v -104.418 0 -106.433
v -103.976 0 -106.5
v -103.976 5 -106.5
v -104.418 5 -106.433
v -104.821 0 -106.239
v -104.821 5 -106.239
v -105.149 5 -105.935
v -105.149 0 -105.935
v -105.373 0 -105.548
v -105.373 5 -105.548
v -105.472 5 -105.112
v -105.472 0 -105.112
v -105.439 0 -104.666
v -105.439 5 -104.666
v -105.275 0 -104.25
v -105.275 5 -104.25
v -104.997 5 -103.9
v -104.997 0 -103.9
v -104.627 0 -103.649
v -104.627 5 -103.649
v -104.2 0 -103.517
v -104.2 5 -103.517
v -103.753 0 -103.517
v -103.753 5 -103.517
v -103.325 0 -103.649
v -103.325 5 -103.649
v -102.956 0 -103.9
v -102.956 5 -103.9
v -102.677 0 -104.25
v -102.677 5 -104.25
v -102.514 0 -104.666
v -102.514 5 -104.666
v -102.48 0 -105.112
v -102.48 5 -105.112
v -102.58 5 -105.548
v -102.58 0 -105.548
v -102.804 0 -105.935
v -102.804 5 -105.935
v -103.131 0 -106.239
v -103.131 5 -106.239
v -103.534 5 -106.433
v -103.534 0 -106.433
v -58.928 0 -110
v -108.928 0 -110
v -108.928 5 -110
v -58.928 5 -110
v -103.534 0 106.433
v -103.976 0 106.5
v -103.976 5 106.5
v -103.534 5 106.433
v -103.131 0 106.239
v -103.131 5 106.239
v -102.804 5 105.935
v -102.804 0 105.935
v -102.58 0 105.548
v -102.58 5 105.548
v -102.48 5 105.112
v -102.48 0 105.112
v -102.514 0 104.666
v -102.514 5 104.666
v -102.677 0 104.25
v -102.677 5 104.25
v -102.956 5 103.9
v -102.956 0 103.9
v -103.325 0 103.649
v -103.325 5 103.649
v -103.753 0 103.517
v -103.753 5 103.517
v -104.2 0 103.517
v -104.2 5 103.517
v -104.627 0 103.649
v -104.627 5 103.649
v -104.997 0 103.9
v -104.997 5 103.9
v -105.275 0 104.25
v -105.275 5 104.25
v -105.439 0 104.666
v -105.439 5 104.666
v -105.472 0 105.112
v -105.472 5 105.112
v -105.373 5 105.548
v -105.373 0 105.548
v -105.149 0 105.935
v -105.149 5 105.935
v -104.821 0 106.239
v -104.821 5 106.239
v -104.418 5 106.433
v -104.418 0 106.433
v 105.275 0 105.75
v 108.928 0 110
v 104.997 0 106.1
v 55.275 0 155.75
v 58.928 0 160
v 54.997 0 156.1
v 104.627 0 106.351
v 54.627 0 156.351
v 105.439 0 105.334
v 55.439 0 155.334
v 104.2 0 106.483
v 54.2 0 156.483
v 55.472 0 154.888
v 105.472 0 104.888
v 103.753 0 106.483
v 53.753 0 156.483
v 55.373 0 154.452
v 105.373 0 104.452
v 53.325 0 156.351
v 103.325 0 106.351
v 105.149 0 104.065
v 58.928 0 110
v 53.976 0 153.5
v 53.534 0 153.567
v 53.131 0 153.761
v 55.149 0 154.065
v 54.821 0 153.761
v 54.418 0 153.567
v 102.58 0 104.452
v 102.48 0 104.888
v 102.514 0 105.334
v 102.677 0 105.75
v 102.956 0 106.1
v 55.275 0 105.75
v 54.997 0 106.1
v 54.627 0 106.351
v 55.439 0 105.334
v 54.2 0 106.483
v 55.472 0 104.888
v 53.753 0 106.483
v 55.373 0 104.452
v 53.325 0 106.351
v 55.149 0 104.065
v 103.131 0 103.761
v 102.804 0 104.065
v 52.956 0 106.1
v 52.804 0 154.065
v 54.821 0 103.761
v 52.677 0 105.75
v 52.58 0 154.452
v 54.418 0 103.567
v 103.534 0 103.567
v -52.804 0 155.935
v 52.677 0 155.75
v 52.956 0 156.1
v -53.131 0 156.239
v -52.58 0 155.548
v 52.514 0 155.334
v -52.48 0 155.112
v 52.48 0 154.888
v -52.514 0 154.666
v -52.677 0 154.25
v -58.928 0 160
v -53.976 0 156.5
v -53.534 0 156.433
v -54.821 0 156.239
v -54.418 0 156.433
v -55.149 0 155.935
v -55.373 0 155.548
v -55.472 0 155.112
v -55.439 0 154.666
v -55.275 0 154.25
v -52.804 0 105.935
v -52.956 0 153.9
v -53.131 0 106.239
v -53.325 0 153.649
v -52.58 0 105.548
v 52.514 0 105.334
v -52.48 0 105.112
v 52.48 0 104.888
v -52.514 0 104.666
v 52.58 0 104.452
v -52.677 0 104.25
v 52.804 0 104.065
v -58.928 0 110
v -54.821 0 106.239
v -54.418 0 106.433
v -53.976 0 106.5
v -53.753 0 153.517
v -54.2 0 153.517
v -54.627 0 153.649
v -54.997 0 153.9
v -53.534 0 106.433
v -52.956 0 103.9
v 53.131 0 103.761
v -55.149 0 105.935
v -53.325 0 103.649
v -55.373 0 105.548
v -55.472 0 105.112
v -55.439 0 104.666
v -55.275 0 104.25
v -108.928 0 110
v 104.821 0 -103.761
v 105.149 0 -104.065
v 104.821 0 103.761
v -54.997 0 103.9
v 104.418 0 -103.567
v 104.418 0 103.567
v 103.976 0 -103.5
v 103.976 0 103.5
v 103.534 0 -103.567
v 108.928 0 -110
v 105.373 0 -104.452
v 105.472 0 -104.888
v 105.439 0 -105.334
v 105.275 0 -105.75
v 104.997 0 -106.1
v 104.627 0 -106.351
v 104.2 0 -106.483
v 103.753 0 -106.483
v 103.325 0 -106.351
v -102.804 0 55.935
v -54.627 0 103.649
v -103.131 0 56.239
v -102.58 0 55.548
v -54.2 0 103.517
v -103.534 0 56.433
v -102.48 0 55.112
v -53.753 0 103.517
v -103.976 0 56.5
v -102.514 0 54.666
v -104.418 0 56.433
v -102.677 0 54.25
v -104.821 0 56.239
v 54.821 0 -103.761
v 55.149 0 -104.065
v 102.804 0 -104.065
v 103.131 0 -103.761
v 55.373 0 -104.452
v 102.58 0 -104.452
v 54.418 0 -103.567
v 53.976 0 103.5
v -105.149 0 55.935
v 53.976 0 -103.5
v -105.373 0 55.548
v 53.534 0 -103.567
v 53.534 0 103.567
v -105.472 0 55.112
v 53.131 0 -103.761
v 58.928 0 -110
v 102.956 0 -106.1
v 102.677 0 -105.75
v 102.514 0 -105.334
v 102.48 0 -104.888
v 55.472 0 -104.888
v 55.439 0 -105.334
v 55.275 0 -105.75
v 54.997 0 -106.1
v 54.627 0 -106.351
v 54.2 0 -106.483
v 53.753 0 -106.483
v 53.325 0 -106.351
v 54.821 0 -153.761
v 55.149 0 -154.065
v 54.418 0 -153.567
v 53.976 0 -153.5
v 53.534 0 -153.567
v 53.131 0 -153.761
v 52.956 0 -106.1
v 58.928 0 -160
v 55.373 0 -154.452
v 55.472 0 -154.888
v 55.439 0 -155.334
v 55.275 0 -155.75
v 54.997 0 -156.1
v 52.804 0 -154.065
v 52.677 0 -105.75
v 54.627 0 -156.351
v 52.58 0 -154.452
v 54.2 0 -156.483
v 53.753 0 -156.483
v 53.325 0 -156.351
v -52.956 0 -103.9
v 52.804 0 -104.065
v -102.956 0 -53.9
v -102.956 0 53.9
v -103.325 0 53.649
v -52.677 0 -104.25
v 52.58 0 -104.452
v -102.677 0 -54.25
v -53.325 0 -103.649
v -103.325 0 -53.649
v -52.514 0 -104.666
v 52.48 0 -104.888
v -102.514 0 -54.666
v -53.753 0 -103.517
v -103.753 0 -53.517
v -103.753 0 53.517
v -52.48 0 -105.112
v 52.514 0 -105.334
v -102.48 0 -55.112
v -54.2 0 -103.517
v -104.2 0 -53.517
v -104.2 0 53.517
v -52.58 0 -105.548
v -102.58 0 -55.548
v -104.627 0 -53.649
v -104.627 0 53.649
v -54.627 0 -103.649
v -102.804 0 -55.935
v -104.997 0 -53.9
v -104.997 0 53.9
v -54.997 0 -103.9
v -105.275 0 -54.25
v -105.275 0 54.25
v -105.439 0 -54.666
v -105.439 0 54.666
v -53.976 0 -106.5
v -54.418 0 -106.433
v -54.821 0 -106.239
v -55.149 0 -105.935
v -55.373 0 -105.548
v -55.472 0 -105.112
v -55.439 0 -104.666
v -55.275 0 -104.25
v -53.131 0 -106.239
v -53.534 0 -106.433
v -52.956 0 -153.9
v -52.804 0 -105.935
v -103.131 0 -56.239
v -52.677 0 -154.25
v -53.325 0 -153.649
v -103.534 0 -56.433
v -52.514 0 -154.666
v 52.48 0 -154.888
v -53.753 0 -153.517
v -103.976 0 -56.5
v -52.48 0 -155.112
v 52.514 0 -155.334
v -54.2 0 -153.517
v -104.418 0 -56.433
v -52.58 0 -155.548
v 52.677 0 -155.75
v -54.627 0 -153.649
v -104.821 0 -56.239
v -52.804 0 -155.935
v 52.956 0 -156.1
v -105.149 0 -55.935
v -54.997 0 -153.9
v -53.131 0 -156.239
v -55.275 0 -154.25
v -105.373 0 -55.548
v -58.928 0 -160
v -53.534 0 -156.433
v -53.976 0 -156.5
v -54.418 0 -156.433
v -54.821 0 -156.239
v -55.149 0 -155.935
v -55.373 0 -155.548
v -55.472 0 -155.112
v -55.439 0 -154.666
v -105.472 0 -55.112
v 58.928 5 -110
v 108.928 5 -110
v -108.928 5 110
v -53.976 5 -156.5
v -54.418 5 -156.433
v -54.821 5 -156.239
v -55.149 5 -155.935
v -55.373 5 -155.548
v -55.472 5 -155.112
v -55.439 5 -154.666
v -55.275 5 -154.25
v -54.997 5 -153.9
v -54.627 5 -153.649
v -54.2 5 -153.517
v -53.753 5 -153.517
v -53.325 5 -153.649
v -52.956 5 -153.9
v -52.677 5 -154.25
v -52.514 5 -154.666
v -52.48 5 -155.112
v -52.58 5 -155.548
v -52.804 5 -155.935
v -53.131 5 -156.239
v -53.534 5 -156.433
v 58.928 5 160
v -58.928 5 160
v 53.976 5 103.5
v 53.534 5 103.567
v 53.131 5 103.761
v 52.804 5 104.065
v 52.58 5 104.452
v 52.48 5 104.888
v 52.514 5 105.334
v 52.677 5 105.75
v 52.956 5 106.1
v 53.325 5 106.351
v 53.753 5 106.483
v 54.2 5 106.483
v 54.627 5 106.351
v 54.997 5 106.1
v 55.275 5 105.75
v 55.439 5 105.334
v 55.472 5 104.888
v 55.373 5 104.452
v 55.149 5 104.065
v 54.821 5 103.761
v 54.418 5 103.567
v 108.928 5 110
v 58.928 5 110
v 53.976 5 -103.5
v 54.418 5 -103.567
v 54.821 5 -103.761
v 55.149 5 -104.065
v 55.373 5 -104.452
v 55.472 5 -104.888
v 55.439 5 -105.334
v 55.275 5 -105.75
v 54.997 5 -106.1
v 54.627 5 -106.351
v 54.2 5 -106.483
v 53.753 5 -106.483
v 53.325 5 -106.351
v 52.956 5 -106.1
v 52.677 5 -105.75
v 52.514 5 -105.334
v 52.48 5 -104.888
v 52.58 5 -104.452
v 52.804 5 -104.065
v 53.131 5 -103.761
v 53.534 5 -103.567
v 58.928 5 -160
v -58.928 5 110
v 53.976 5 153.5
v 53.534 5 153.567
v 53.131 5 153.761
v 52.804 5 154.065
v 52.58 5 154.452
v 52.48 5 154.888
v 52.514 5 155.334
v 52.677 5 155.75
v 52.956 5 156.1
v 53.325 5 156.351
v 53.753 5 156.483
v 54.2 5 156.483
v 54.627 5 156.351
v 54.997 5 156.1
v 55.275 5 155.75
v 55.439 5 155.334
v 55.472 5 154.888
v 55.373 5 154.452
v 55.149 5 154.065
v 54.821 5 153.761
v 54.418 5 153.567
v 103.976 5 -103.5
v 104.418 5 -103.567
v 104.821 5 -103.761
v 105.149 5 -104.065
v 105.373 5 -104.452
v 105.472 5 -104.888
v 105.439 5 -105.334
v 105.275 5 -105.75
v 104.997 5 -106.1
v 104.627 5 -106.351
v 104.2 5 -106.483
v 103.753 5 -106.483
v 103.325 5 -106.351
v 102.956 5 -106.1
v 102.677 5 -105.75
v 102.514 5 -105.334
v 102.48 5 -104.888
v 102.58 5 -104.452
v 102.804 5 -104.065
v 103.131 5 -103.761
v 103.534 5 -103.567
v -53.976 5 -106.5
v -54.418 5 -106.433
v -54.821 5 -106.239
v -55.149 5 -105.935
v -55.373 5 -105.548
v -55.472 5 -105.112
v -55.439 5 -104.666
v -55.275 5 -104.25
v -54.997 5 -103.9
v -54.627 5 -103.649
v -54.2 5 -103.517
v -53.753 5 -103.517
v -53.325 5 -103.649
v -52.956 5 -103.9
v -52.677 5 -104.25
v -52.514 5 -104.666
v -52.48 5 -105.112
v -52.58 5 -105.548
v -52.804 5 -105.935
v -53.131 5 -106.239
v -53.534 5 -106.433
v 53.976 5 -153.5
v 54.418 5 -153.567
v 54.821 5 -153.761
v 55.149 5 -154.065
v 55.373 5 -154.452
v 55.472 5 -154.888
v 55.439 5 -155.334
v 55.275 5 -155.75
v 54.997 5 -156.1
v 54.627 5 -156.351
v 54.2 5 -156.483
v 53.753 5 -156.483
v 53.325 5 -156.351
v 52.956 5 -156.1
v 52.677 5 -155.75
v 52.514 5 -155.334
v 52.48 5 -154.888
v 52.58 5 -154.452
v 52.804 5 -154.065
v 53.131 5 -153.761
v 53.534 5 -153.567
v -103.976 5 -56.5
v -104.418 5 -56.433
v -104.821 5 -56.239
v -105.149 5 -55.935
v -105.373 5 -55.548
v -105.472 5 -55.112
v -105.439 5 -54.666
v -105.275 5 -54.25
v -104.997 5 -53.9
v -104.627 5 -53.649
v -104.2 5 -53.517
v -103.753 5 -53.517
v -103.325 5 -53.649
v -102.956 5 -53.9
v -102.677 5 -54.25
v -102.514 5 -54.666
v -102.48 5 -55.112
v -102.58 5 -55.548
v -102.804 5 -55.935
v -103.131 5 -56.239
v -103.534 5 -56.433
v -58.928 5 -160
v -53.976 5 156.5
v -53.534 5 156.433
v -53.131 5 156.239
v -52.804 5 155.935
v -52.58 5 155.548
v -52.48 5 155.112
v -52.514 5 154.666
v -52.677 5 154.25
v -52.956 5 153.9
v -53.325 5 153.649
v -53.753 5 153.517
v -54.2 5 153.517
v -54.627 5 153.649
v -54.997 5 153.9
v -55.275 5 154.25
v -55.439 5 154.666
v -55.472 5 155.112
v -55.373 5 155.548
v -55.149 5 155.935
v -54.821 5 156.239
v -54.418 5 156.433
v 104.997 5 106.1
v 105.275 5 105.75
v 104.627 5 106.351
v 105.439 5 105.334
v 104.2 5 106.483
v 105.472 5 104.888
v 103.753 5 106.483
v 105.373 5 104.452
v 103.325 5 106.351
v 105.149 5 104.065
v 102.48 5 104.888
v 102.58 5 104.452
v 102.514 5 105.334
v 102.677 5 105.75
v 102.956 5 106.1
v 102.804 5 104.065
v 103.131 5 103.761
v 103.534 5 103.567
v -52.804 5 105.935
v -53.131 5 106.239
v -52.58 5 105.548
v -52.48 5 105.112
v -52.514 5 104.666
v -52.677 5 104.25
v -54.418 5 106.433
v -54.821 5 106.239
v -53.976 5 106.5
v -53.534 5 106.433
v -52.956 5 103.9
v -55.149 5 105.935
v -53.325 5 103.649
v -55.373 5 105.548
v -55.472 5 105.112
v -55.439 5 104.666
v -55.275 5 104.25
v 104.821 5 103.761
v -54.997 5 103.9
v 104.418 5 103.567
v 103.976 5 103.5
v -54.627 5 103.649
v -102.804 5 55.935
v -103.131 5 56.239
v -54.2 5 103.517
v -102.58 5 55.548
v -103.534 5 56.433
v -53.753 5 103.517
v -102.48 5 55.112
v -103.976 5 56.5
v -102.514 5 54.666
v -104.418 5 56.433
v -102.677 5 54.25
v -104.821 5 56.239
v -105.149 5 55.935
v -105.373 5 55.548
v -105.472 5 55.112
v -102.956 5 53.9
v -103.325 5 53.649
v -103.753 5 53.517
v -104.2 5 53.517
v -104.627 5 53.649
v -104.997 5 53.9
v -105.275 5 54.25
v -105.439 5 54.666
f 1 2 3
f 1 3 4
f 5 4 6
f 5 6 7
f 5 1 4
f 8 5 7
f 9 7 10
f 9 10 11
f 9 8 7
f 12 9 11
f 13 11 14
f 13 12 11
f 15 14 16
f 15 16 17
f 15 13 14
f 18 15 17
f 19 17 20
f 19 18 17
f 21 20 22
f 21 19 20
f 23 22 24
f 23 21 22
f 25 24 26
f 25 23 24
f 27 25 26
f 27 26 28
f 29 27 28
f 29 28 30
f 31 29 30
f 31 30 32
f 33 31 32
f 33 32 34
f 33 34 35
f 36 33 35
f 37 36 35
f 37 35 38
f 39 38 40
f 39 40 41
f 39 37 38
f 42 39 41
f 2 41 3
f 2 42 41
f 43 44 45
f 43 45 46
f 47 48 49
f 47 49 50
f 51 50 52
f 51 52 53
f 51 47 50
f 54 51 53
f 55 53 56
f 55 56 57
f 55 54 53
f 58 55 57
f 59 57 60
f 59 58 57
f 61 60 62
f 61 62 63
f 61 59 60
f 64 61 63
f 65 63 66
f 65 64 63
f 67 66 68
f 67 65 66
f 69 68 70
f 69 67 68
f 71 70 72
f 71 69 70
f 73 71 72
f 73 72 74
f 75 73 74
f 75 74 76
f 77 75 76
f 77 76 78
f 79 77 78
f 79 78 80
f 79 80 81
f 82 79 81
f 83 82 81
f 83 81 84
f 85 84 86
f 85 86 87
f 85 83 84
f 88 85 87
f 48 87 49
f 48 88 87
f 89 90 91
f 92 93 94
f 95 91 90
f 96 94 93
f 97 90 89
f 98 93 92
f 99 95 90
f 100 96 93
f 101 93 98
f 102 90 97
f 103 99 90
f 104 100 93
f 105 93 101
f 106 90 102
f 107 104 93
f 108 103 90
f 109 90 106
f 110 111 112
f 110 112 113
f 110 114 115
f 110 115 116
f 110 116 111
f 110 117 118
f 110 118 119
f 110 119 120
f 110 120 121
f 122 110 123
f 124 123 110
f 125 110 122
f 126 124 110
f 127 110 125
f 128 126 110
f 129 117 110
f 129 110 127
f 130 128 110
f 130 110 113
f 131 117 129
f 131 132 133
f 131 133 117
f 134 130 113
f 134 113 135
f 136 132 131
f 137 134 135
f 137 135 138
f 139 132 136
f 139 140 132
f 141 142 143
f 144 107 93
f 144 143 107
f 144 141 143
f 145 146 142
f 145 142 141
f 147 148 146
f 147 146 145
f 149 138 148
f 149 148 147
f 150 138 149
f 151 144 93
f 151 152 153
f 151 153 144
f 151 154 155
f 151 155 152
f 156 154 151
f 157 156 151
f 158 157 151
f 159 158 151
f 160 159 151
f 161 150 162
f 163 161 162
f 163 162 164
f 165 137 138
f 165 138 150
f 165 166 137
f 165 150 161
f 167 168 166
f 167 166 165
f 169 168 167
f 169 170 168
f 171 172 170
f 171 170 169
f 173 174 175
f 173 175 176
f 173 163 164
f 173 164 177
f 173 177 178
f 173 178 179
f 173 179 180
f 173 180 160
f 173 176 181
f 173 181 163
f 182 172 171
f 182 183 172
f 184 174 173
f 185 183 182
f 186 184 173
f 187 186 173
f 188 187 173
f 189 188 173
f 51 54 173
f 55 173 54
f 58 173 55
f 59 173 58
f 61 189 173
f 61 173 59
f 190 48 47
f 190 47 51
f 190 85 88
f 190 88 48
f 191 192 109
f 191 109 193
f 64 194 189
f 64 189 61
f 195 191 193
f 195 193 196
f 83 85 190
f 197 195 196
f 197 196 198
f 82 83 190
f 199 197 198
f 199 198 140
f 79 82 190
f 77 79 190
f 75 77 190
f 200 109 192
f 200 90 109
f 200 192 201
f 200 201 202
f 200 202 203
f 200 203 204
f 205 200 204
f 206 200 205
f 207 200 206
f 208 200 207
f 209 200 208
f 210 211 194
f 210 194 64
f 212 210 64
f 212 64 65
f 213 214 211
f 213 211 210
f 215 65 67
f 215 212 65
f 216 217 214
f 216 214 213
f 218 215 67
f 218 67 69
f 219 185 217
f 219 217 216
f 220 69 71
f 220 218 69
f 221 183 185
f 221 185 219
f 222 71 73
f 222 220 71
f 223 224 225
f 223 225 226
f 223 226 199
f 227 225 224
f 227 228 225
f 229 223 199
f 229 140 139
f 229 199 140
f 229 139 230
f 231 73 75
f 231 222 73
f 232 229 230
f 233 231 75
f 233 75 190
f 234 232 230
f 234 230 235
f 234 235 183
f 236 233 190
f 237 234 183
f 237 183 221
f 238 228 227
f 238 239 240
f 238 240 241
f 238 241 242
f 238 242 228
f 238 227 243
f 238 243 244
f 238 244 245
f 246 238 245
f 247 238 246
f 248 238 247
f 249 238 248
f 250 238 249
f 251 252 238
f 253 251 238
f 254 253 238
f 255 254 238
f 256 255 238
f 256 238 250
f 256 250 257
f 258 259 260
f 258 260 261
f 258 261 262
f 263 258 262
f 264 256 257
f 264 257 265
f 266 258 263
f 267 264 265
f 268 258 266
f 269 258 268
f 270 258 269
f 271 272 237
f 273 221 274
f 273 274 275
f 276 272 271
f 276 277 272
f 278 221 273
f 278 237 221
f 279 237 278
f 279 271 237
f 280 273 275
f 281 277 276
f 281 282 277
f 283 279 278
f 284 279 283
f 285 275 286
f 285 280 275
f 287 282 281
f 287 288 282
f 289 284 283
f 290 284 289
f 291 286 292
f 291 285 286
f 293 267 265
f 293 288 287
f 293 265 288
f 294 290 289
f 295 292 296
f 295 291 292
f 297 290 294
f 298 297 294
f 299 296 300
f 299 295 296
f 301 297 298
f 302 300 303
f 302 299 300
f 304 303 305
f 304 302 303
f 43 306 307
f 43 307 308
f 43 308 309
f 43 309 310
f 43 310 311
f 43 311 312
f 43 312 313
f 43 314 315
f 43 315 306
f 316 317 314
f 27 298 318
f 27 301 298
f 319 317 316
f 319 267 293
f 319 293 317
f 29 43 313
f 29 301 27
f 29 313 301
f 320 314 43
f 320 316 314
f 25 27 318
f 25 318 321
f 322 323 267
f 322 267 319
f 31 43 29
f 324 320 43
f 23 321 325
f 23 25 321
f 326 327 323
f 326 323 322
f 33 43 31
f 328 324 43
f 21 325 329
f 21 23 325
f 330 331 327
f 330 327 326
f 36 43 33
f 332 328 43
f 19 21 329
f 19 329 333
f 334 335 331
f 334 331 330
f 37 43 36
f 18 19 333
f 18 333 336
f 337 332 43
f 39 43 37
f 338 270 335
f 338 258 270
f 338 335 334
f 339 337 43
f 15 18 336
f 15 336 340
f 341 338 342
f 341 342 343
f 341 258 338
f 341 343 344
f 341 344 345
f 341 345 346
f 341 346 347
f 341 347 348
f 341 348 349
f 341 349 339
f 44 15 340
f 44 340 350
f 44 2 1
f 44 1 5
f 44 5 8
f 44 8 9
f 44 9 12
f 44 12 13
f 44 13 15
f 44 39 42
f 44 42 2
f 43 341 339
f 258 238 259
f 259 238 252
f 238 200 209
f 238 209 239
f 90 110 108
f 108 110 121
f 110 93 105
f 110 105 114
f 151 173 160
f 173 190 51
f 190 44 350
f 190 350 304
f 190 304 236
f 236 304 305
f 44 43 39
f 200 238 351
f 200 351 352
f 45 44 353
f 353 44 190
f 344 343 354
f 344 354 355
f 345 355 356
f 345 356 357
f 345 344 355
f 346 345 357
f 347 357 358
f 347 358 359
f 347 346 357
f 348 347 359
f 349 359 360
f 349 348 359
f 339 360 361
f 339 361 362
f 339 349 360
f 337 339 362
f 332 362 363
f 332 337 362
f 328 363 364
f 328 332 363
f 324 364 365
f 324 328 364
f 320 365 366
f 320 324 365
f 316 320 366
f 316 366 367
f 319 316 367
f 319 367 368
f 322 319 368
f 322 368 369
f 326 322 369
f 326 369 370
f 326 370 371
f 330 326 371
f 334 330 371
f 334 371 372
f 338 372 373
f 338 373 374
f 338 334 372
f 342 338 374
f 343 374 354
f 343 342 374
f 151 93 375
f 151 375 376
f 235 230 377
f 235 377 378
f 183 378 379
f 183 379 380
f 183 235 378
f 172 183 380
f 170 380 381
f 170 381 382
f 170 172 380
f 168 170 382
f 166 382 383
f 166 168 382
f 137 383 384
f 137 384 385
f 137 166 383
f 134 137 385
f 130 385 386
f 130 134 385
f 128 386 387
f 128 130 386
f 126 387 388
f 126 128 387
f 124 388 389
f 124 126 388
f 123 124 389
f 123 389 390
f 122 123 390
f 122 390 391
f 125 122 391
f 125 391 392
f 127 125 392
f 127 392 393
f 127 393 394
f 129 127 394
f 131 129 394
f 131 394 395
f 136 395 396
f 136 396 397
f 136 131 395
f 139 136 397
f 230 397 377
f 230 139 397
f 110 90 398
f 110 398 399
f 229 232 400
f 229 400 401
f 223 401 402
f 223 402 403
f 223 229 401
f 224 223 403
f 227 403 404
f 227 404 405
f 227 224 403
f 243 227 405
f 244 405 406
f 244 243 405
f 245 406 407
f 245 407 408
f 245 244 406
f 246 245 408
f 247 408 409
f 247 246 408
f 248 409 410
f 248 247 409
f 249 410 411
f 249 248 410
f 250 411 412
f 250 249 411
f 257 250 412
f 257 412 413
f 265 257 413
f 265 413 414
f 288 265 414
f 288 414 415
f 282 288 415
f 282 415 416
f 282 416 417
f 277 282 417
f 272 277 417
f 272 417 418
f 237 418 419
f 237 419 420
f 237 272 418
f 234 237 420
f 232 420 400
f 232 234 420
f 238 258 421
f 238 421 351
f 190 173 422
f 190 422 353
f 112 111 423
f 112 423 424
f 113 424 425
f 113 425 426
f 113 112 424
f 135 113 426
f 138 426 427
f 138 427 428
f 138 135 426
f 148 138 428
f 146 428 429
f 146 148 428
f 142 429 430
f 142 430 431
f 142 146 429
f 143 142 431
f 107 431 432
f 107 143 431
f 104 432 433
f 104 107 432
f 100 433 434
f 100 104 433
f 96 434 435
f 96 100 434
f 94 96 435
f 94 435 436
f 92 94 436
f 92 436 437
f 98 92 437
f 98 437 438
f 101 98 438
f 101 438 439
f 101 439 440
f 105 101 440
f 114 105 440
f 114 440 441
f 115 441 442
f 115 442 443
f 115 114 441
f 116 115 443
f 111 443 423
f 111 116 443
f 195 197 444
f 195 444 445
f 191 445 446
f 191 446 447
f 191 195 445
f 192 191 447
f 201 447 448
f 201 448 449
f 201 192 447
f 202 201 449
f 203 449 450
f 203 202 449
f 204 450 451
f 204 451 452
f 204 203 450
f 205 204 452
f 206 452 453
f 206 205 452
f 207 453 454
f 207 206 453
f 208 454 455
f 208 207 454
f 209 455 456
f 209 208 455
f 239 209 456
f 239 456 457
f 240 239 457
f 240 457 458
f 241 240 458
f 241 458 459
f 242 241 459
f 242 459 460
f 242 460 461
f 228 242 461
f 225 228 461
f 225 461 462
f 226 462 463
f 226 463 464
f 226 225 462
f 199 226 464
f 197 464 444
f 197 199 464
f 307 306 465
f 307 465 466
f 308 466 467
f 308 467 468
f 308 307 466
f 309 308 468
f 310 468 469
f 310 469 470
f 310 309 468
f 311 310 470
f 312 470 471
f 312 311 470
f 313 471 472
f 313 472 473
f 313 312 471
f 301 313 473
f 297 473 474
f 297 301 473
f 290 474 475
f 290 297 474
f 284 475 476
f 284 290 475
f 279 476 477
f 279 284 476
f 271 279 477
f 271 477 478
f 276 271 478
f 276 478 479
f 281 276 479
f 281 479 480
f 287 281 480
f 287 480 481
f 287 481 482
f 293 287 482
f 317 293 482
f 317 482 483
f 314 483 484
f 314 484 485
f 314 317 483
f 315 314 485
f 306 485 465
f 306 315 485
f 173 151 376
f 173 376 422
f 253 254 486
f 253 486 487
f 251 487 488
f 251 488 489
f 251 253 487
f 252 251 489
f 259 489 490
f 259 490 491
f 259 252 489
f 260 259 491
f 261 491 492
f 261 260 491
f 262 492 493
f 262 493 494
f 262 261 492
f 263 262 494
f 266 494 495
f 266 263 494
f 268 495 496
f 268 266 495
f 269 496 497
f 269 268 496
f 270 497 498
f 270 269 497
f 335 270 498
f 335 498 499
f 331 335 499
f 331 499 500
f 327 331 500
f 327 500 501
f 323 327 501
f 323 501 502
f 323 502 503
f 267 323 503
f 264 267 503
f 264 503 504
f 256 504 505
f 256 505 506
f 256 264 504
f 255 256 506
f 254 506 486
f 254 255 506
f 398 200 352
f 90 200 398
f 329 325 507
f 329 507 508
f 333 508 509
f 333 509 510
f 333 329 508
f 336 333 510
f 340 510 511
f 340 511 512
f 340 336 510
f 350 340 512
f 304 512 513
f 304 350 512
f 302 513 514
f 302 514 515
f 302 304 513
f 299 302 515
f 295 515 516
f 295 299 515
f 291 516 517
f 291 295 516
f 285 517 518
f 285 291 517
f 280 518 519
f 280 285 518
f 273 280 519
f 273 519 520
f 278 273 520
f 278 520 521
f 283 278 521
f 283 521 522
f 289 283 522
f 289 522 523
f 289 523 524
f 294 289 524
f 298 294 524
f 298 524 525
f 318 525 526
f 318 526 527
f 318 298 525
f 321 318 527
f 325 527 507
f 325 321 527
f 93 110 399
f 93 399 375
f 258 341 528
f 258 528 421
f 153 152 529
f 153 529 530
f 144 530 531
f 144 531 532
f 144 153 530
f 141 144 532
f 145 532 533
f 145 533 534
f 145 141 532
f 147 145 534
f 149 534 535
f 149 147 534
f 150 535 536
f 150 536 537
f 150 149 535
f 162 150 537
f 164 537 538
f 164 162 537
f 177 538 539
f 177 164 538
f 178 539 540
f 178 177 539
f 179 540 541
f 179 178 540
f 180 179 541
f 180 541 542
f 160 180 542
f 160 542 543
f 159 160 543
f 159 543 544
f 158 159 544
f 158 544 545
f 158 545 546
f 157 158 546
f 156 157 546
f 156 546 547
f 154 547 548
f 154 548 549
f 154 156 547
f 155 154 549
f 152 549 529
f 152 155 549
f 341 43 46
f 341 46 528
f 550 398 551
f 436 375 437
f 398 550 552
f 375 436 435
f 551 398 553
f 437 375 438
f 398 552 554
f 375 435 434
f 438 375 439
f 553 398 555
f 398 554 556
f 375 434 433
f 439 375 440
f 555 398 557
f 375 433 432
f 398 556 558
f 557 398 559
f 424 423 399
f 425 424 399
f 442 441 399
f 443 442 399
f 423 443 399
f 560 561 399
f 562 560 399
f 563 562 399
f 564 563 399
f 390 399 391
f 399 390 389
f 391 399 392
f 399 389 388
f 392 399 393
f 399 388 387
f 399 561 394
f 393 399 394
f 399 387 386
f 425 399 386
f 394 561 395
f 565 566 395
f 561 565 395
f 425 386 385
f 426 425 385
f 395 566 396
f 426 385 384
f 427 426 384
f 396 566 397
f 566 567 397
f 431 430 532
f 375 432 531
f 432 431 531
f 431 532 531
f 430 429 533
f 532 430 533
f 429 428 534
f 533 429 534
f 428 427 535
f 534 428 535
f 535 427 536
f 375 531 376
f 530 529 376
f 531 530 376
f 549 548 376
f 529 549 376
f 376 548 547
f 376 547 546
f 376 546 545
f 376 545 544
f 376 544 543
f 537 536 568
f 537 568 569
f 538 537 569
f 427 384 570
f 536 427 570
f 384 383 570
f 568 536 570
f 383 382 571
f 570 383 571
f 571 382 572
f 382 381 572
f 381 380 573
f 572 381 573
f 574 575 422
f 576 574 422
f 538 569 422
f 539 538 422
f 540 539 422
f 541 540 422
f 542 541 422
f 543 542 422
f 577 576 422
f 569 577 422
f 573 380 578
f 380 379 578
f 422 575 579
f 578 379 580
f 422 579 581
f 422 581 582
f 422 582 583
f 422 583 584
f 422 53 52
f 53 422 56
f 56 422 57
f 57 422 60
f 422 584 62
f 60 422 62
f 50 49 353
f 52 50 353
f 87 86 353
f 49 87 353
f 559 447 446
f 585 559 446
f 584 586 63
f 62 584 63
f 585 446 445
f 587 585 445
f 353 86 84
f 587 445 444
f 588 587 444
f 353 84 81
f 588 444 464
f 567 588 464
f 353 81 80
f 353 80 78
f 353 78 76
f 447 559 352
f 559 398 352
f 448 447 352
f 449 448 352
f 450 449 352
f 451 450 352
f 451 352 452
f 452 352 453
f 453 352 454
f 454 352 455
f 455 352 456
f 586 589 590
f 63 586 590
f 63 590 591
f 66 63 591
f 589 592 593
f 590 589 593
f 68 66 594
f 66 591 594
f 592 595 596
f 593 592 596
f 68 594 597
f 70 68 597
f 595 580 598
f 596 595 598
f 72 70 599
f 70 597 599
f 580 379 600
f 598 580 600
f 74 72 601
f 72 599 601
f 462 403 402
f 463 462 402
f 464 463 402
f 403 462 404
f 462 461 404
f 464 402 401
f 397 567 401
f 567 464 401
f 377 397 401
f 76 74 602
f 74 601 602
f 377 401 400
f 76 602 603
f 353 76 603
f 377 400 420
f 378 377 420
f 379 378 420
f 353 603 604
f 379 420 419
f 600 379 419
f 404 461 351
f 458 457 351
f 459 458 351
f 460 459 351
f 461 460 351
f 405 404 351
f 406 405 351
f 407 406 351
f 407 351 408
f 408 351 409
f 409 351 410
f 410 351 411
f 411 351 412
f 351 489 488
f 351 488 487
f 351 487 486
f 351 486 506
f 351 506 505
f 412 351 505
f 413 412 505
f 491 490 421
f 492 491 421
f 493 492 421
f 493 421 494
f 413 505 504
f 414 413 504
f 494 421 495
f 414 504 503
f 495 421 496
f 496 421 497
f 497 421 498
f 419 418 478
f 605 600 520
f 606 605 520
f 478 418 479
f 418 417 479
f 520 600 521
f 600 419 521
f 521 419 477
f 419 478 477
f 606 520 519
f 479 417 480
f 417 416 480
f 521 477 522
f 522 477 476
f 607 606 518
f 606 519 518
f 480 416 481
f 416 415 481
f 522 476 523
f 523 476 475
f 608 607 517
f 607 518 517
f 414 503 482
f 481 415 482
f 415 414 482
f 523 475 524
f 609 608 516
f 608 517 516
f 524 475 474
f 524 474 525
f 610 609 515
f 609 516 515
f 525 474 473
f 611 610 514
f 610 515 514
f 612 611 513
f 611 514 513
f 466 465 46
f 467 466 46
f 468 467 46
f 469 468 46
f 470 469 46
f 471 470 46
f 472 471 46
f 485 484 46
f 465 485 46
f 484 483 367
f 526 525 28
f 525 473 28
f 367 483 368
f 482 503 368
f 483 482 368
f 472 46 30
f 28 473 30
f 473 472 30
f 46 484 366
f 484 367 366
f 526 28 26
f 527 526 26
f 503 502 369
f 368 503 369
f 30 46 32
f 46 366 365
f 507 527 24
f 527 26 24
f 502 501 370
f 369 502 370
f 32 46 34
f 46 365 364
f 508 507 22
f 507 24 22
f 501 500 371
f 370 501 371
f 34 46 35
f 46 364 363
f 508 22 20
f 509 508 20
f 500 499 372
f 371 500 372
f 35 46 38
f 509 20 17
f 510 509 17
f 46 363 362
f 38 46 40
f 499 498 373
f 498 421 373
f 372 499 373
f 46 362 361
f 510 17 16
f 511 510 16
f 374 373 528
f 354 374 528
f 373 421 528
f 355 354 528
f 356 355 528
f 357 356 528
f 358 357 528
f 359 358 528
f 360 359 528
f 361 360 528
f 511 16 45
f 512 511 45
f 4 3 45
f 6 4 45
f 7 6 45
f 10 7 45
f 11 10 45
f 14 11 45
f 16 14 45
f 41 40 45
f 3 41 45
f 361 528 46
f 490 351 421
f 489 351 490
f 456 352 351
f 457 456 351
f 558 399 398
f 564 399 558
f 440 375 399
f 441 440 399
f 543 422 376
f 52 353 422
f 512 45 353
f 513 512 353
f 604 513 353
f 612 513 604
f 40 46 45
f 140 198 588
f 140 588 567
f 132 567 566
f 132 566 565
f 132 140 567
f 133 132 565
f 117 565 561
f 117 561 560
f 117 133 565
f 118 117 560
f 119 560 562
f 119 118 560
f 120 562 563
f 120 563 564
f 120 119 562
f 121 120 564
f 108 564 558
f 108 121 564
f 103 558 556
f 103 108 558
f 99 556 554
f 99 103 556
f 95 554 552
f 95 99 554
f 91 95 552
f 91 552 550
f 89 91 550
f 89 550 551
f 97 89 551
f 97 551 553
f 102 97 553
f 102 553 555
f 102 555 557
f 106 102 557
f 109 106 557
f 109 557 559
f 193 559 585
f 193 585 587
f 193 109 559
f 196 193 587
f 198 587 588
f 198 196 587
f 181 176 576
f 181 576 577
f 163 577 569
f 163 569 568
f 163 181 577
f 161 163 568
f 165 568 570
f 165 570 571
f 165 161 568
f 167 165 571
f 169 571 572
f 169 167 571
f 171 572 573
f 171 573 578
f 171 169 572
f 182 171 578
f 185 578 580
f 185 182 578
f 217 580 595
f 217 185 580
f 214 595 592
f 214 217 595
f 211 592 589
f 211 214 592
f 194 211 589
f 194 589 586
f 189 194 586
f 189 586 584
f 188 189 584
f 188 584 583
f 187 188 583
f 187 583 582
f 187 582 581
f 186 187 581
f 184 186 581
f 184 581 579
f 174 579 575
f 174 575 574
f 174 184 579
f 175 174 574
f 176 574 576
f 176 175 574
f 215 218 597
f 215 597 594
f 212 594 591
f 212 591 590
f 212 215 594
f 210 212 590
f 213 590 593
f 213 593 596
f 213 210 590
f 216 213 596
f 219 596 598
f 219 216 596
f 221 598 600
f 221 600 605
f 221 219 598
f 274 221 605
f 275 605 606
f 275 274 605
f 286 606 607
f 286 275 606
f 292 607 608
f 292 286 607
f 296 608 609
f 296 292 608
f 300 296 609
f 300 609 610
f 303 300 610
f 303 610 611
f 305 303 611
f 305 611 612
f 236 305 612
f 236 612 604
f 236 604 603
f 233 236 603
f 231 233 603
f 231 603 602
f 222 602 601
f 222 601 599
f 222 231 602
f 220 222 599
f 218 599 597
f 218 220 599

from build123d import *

# Parameters (mm, degrees)
ESQUISSE1_R        = 1.5
BOSS_EXTRU_1_DEPTH = 5


with BuildPart() as part:
    # Esquisse1 → Boss.-Extru.1 (new body)
    with BuildSketch(Plane(origin=(0, 0, 0), x_dir=(1, 0, 0), z_dir=(0, 1, 0))):
        Polygon((-58.927554829, 110), (-58.927554829, 160), (58.927554829, 160), (58.927554829, 110), (108.927554829, 110), (108.927554829, -110), (58.927554829, -110), (58.927554829, -160), (-58.927554829, -160), (-58.927554829, -110), (-108.927554829, -110), (-108.927554829, 0), (-108.927554829, 110), align=None)
        with Locations(Location((-103.976302336, -105, 0), (0, 0, 270))):
            Circle(ESQUISSE1_R, mode=Mode.SUBTRACT)
        with Locations(Location((-103.976302336, -55, 0), (0, 0, 270))):
            Circle(ESQUISSE1_R, mode=Mode.SUBTRACT)
        with Locations(Location((-53.976302336, -105, 0), (0, 0, 270))):
            Circle(ESQUISSE1_R, mode=Mode.SUBTRACT)
        with Locations(Location((-53.976302336, -155, 0), (0, 0, 270))):
            Circle(ESQUISSE1_R, mode=Mode.SUBTRACT)
        with Locations(Location((-53.976302336, 155, 0), (0, 0, 90))):
            Circle(ESQUISSE1_R, mode=Mode.SUBTRACT)
        with Locations(Location((-53.976302336, 105, 0), (0, 0, 90))):
            Circle(ESQUISSE1_R, mode=Mode.SUBTRACT)
        with Locations(Location((-103.976302336, 105, 0), (0, 0, 90))):
            Circle(ESQUISSE1_R, mode=Mode.SUBTRACT)
        with Locations(Location((-103.976302336, 55, 0), (0, 0, 90))):
            Circle(ESQUISSE1_R, mode=Mode.SUBTRACT)
        with Locations(Location((53.976302336, -155, 0), (0, 0, 90))):
            Circle(ESQUISSE1_R, mode=Mode.SUBTRACT)
        with Locations(Location((53.976302336, -105, 0), (0, 0, 90))):
            Circle(ESQUISSE1_R, mode=Mode.SUBTRACT)
        with Locations(Location((103.976302336, -105, 0), (0, 0, 90))):
            Circle(ESQUISSE1_R, mode=Mode.SUBTRACT)
        with Locations(Location((103.976302336, 105, 0), (0, 0, 270))):
            Circle(ESQUISSE1_R, mode=Mode.SUBTRACT)
        with Locations(Location((53.976302336, 105, 0), (0, 0, 270))):
            Circle(ESQUISSE1_R, mode=Mode.SUBTRACT)
        with Locations(Location((53.976302336, 155, 0), (0, 0, 270))):
            Circle(ESQUISSE1_R, mode=Mode.SUBTRACT)
    extrude(amount=BOSS_EXTRU_1_DEPTH)


solid = part.part
